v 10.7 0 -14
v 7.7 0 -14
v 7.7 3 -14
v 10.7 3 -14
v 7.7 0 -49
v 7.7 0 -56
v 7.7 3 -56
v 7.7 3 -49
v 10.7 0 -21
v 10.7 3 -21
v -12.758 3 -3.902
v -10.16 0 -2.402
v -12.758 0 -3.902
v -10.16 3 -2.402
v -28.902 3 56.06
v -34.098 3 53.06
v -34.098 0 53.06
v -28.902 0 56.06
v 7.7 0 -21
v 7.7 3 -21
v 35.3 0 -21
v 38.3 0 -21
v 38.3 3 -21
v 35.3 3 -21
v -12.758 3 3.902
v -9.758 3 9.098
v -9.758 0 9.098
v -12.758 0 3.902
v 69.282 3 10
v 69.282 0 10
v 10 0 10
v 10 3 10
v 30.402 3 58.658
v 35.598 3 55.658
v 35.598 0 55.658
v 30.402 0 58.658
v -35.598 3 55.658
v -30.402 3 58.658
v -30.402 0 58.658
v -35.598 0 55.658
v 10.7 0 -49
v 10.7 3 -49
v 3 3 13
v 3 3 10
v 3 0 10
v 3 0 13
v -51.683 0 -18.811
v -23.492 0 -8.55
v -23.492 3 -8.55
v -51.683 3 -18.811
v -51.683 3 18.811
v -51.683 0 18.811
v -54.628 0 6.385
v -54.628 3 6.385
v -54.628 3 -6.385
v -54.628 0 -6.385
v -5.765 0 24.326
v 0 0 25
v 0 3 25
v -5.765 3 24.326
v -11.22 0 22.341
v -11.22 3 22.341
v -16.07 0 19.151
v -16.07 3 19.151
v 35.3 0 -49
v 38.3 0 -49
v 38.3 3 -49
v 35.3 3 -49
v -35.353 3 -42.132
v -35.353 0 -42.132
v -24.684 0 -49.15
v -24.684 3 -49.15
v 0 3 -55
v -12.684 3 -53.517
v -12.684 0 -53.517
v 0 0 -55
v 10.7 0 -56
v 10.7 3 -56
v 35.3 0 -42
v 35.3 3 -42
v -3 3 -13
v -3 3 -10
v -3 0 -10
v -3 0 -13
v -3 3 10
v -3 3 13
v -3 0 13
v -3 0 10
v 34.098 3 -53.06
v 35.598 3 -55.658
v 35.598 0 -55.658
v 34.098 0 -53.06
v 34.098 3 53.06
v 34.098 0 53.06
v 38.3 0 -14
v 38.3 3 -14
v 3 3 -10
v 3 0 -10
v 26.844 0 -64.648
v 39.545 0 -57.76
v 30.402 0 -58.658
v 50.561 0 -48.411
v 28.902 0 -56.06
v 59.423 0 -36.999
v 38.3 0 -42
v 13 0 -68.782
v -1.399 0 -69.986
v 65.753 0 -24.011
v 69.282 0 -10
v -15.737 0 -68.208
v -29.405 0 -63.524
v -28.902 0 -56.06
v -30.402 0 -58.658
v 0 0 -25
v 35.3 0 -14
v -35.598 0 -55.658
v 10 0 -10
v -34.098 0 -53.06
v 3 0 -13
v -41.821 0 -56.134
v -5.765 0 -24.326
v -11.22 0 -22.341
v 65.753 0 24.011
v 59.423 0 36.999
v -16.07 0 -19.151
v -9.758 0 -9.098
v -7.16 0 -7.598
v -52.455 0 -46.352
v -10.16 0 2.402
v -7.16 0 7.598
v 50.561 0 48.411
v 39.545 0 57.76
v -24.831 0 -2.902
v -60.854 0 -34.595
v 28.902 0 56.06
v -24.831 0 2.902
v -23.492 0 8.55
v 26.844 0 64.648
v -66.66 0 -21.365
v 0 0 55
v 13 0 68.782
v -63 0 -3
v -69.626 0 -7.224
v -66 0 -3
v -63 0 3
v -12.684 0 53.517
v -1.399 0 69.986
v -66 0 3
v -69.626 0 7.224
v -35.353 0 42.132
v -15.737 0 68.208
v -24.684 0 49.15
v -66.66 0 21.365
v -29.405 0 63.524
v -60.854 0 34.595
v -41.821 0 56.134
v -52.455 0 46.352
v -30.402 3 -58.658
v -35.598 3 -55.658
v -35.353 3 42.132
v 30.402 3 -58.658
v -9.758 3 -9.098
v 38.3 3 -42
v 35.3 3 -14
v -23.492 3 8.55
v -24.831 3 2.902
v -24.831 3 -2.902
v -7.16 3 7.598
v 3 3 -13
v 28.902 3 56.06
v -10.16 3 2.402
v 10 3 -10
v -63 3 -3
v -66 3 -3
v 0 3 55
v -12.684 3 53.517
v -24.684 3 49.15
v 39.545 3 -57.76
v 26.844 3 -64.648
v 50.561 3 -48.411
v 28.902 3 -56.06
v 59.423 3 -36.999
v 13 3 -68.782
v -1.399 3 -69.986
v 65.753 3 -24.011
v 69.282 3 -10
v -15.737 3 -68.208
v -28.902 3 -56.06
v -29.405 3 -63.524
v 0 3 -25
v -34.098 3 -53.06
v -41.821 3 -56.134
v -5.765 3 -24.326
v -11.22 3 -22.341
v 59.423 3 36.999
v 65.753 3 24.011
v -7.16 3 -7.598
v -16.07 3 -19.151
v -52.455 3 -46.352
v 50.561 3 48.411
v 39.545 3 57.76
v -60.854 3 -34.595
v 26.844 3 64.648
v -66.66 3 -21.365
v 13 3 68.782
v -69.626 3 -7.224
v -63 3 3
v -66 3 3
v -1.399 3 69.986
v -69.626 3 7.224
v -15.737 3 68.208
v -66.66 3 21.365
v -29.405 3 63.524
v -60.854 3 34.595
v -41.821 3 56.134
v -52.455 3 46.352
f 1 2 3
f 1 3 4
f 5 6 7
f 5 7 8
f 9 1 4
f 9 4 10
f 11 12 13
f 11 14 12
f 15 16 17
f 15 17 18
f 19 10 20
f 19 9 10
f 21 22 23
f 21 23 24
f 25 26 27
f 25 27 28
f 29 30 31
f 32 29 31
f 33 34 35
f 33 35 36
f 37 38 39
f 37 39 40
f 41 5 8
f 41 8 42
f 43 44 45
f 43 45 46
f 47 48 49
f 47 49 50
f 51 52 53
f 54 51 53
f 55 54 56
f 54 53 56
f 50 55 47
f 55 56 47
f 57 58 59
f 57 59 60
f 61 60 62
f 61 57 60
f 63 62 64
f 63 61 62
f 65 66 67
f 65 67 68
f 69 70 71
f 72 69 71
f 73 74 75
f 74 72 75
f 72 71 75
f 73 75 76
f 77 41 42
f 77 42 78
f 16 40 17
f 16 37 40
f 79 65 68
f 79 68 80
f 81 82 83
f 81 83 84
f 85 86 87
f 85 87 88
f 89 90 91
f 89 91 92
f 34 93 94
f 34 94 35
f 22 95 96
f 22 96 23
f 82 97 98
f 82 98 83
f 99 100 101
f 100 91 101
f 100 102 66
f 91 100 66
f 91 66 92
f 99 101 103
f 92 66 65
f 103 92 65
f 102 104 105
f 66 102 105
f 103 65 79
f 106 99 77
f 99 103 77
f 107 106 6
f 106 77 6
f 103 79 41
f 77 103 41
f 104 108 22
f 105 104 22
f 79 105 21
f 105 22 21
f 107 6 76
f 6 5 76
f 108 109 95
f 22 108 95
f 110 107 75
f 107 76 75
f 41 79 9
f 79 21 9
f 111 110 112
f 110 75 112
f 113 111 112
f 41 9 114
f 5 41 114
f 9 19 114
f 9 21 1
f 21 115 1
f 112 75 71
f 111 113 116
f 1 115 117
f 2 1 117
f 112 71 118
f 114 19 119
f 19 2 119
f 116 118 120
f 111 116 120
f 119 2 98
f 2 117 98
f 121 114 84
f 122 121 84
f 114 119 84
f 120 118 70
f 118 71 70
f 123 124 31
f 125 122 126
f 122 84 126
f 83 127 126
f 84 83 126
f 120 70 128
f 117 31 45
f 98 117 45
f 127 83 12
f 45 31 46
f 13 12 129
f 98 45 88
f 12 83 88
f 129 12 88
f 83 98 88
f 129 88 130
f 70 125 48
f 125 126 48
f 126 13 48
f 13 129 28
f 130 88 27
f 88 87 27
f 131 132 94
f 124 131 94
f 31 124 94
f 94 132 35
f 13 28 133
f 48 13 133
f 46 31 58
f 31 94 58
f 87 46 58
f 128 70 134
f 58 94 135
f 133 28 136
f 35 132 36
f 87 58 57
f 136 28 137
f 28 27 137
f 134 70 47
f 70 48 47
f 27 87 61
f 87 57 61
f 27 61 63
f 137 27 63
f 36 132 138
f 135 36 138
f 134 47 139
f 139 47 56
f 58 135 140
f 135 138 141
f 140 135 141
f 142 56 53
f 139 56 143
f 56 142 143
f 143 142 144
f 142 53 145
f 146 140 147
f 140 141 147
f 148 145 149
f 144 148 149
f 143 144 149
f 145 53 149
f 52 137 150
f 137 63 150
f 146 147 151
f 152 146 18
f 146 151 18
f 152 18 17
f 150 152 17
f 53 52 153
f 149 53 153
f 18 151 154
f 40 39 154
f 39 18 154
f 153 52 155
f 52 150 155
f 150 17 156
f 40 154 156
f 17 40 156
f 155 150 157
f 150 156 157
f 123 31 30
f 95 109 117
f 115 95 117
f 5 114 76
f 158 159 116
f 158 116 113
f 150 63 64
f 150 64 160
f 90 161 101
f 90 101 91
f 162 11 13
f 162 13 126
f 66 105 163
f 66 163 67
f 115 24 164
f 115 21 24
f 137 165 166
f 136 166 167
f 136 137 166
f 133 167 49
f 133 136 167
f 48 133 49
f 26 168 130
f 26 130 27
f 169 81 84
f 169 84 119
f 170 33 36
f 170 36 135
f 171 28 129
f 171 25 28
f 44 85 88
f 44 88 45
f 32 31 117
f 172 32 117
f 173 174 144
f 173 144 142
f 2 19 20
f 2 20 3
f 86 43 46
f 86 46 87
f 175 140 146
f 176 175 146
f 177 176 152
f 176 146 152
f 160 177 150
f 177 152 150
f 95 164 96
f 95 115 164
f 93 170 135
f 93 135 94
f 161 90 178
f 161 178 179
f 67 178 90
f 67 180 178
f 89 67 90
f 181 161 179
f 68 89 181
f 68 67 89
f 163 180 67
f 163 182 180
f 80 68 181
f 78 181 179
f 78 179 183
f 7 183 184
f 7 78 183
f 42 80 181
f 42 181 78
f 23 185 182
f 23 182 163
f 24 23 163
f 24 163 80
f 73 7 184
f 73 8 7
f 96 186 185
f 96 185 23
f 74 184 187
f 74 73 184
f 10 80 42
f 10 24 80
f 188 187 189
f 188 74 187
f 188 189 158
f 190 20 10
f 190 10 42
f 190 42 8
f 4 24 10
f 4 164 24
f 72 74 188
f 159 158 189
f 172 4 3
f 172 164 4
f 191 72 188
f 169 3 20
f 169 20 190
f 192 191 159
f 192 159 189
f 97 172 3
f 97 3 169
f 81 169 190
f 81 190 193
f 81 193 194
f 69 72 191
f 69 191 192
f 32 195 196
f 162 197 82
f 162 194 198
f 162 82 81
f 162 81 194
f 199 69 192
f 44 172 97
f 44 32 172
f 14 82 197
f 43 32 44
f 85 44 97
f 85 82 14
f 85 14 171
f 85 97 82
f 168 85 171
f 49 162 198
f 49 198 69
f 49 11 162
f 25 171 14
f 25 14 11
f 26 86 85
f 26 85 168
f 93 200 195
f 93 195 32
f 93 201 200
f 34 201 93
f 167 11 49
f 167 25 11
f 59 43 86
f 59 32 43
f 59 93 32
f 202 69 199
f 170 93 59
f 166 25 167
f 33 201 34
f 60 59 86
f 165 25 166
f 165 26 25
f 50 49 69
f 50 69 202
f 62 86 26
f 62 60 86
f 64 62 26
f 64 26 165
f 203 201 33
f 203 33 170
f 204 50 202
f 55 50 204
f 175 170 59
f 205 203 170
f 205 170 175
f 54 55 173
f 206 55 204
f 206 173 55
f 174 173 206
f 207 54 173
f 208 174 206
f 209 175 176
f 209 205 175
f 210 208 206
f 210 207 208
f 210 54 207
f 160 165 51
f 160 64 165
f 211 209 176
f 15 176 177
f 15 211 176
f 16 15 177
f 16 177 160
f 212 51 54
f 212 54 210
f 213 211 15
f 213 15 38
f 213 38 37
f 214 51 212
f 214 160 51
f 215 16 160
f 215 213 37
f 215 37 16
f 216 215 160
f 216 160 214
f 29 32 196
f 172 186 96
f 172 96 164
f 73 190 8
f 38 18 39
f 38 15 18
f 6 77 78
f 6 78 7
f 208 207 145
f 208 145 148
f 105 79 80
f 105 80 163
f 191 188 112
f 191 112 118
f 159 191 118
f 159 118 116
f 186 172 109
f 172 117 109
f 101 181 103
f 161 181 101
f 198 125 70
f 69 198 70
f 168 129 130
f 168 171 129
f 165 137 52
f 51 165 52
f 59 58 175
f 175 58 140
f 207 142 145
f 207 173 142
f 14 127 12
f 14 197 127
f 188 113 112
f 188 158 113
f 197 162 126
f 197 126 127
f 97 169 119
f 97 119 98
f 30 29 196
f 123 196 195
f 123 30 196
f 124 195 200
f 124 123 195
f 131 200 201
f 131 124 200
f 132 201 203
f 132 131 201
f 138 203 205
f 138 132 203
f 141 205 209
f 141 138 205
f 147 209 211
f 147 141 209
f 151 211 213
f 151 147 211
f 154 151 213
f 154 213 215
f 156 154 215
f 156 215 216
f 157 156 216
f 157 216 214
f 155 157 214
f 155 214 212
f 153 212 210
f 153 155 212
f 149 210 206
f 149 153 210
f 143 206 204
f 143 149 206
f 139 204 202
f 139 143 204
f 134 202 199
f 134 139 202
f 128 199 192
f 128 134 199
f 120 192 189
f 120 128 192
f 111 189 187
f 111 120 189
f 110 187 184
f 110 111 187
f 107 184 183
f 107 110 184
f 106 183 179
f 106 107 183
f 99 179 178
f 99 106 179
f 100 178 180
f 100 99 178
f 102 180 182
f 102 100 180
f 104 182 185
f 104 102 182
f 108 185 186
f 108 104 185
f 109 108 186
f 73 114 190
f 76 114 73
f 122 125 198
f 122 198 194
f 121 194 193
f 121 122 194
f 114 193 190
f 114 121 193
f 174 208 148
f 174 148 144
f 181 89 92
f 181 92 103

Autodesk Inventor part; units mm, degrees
ref_plane "YZ Plane" through (0, 0, 0) normal (1, 0, 0) x (0, 1, 0)
ref_plane "XZ Plane" through (0, 0, 0) normal (0, 1, 0) x (-1, 0, 0)
ref_plane "XY Plane" through (0, 0, 0) normal (0, 0, 1) x (1, 0, 0)
sketch "草圖1" plane through (0, 0, 0) normal (0, 1, 0) x (-1, 0, 0)
  circle A0 centre (0, 0) radius 70
  circle A1 centre (0, 0) radius 25
  line L0 (-70, 10) -> (-10, 10)
  line L1 (-10, 10) -> (-10, -10)
  line L2 (-10, -10) -> (-70, -10)
  line L3 (-70, -10) -> (-70, 10)
  line L4 (0, 0) -> (0, -55)
  line L5 (0, 0) -> (35.3533, -42.1324)
  arc A2 (0, -55) -> (35.3533, -42.1324) centre (0, 0) ccw
  line L6 (0, 0) -> (51.6831, -18.8111)
  line L7 (0, 0) -> (51.6831, 18.8111)
  arc A3 (51.6831, -18.8111) -> (51.6831, 18.8111) centre (0, 0) ccw
  line L8 (0, 0) -> (35.3533, 42.1324)
  line L9 (0, 0) -> (0, 55)
  arc A4 (35.3533, 42.1324) -> (0, 55) centre (0, 0) ccw
  line L10 (-9.2, -7) -> (-36.8, -7)
  line L11 (-36.8, -7) -> (-36.8, -63)
  line L12 (-36.8, -63) -> (-9.2, -63)
  line L13 (-9.2, -63) -> (-9.2, -7)
  line L14 (-7.7, -14) -> (-10.7, -14)
  line L15 (-10.7, -14) -> (-10.7, -21)
  line L16 (-10.7, -21) -> (-7.7, -21)
  line L17 (-7.7, -21) -> (-7.7, -14)
  line L18 (-7.7, -49) -> (-10.7, -49)
  line L19 (-10.7, -49) -> (-10.7, -56)
  line L20 (-10.7, -56) -> (-7.7, -56)
  line L21 (-7.7, -56) -> (-7.7, -49)
  line L22 (-35.3, -14) -> (-38.3, -14)
  line L23 (-38.3, -14) -> (-38.3, -21)
  line L24 (-38.3, -21) -> (-35.3, -21)
  line L25 (-35.3, -21) -> (-35.3, -14)
  line L26 (-35.3, -42) -> (-38.3, -42)
  line L27 (-38.3, -42) -> (-38.3, -49)
  line L28 (-38.3, -49) -> (-35.3, -49)
  line L29 (-35.3, -49) -> (-35.3, -42)
  circle A5 centre (0, 0) radius 2
  line L30 (-1.5, 1.3229) -> (-1.5, -1.3229)
  point P0 (-23, -10)
  point P1 (-9.2, -14)
  point P2 (-9.2, -56)
  point P3 (-36.8, -14)
  point P4 (-36.8, -42)
  point P5 (16.0697, -19.1511)
  point P6 (0, -25)
  point P7 (-69.282, 10)
  point P8 (-69.282, -10)
  point P9 (16.0697, 19.1511)
  point P10 (0, 25)
  point P11 (23.4923, -8.5505)
  point P12 (23.4923, 8.5505)
  point P13 (-70, 0)
  point P14 (-10, 0)
  point P15 (-23, -7)
  dimension "d0" = 140
  dimension "d1" = 50
  dimension "d2" = 20
  dimension "d3" = 60
  dimension "d4" = 55
  dimension "d5" = 40
  dimension "d6" = 55
  dimension "d9" = 140
  dimension "d12" = 27.6
  dimension "d13" = 56
  dimension "d14" = 7
  dimension "d15" = 3
  dimension "d16" = 7
  dimension "d17" = 7
  dimension "d18" = 3
  dimension "d19" = 7
  dimension "d20" = 7
  dimension "d21" = 3
  dimension "d22" = 7
  dimension "d23" = 7
  dimension "d24" = 3
  dimension "d25" = 21
  dimension "d28" = 4
  dimension "d29" = 1.5
  dimension "d30" = 17
  dimension "d31" = 17
  dimension "d32" = 13
extrude "擠出1" add sketch "草圖1" along normal blind 3 contours A0 L12 L13 L20 L21 L18 A1 L4 A2 L5 L6 A3 L7 L8 A4 L9 L0 | A0 L11 L28 L29 L26 L24 L25 L22 L2 A1 L13 L18 L19 L20 L12 | A1 L9 A5 L4 L13 L16 L17 L14 L10 L1 L0 | A0 L2 L11 L22 L23 L24 L26 L27 L28 | A1 L8 A5 L9 | A1 L7 A5 L8 | A5 L8 L9 | L9 L4 A5 L30 | L2 L1 L10 L13 L14 L15 L16 A1 | A1 L6 A5 L7 | A5 L7 L8 | L5 A5 L4 | L6 A5 L5 | L7 A5 L6 | L30 A5 | A5 L5 A1 L4 | A5 L6 A1 L5
sketch "草圖2" plane through (0, 3, 0) normal (0, 1, 0) x (1, 0, 0)
  line L0 (-3, 13) -> (3, 13)
  line L1 (3, 13) -> (3, 10)
  line L2 (3, 10) -> (-3, 10)
  line L3 (-3, 10) -> (-3, 13)
  line L4 (-12.7583, 3.9019) -> (-9.7583, 9.0981)
  line L5 (-9.7583, 9.0981) -> (-7.1603, 7.5981)
  line L6 (-7.1603, 7.5981) -> (-10.1603, 2.4019)
  line L7 (-10.1603, 2.4019) -> (-12.7583, 3.9019)
  line L8 (-9.7583, -9.0981) -> (-12.7583, -3.9019)
  line L9 (-12.7583, -3.9019) -> (-10.1603, -2.4019)
  line L10 (-10.1603, -2.4019) -> (-7.1603, -7.5981)
  line L11 (-7.1603, -7.5981) -> (-9.7583, -9.0981)
  line L12 (3, -13) -> (-3, -13)
  line L13 (-3, -13) -> (-3, -10)
  line L14 (-3, -10) -> (3, -10)
  line L15 (3, -10) -> (3, -13)
  line L16 (-66, 3) -> (-63, 3)
  line L17 (-63, 3) -> (-63, -3)
  line L18 (-63, -3) -> (-66, -3)
  line L19 (-66, -3) -> (-66, 3)
  line L20 (-34.0981, -53.0596) -> (-28.9019, -56.0596)
  line L21 (-28.9019, -56.0596) -> (-30.4019, -58.6577)
  line L22 (-30.4019, -58.6577) -> (-35.5981, -55.6577)
  line L23 (-35.5981, -55.6577) -> (-34.0981, -53.0596)
  line L24 (28.9019, -56.0596) -> (34.0981, -53.0596)
  line L25 (34.0981, -53.0596) -> (35.5981, -55.6577)
  line L26 (35.5981, -55.6577) -> (30.4019, -58.6577)
  line L27 (30.4019, -58.6577) -> (28.9019, -56.0596)
  line L28 (63, -3) -> (63, 3)
  line L29 (63, 3) -> (66, 3)
  line L30 (66, 3) -> (66, -3)
  line L31 (66, -3) -> (63, -3)
  line L32 (34.0981, 53.0596) -> (28.9019, 56.0596)
  line L33 (28.9019, 56.0596) -> (30.4019, 58.6577)
  line L34 (30.4019, 58.6577) -> (35.5981, 55.6577)
  line L35 (35.5981, 55.6577) -> (34.0981, 53.0596)
  line L36 (-28.9019, 56.0596) -> (-34.0981, 53.0596)
  line L37 (-34.0981, 53.0596) -> (-35.5981, 55.6577)
  line L38 (-35.5981, 55.6577) -> (-30.4019, 58.6577)
  line L39 (-30.4019, 58.6577) -> (-28.9019, 56.0596)
  point P0 (0, 0)
  point P1 (0, 10)
  point P2 (-8.6603, 5)
  point P3 (-8.6603, -5)
  point P4 (0, -10)
  point P5 (-63, 0)
  point P6 (-31.5, -54.5596)
  point P7 (31.5, -54.5596)
  point P8 (63, 0)
  point P9 (31.5, 54.5596)
  point P10 (-31.5, 54.5596)
  dimension "d33" = 3
  dimension "d34" = 6
  dimension "d35" = 10
  dimension "d38" = 180
  dimension "d49" = 3
  dimension "d50" = 6
  dimension "d51" = 63
  dimension "d54" = 360
extrude "擠出2" cut sketch "草圖2" against normal through all contours L0 L1 L2 L3 | L4 L5 L6 L7 | L8 L9 L10 L11 | L12 L13 L14 L15 | L16 L17 L18 L19 | L20 L21 L22 L23 | L24 L25 L26 L27 | L32 L33 L34 L35 | L36 L37 L38 L39
properties part number "rolling_plate_top"
